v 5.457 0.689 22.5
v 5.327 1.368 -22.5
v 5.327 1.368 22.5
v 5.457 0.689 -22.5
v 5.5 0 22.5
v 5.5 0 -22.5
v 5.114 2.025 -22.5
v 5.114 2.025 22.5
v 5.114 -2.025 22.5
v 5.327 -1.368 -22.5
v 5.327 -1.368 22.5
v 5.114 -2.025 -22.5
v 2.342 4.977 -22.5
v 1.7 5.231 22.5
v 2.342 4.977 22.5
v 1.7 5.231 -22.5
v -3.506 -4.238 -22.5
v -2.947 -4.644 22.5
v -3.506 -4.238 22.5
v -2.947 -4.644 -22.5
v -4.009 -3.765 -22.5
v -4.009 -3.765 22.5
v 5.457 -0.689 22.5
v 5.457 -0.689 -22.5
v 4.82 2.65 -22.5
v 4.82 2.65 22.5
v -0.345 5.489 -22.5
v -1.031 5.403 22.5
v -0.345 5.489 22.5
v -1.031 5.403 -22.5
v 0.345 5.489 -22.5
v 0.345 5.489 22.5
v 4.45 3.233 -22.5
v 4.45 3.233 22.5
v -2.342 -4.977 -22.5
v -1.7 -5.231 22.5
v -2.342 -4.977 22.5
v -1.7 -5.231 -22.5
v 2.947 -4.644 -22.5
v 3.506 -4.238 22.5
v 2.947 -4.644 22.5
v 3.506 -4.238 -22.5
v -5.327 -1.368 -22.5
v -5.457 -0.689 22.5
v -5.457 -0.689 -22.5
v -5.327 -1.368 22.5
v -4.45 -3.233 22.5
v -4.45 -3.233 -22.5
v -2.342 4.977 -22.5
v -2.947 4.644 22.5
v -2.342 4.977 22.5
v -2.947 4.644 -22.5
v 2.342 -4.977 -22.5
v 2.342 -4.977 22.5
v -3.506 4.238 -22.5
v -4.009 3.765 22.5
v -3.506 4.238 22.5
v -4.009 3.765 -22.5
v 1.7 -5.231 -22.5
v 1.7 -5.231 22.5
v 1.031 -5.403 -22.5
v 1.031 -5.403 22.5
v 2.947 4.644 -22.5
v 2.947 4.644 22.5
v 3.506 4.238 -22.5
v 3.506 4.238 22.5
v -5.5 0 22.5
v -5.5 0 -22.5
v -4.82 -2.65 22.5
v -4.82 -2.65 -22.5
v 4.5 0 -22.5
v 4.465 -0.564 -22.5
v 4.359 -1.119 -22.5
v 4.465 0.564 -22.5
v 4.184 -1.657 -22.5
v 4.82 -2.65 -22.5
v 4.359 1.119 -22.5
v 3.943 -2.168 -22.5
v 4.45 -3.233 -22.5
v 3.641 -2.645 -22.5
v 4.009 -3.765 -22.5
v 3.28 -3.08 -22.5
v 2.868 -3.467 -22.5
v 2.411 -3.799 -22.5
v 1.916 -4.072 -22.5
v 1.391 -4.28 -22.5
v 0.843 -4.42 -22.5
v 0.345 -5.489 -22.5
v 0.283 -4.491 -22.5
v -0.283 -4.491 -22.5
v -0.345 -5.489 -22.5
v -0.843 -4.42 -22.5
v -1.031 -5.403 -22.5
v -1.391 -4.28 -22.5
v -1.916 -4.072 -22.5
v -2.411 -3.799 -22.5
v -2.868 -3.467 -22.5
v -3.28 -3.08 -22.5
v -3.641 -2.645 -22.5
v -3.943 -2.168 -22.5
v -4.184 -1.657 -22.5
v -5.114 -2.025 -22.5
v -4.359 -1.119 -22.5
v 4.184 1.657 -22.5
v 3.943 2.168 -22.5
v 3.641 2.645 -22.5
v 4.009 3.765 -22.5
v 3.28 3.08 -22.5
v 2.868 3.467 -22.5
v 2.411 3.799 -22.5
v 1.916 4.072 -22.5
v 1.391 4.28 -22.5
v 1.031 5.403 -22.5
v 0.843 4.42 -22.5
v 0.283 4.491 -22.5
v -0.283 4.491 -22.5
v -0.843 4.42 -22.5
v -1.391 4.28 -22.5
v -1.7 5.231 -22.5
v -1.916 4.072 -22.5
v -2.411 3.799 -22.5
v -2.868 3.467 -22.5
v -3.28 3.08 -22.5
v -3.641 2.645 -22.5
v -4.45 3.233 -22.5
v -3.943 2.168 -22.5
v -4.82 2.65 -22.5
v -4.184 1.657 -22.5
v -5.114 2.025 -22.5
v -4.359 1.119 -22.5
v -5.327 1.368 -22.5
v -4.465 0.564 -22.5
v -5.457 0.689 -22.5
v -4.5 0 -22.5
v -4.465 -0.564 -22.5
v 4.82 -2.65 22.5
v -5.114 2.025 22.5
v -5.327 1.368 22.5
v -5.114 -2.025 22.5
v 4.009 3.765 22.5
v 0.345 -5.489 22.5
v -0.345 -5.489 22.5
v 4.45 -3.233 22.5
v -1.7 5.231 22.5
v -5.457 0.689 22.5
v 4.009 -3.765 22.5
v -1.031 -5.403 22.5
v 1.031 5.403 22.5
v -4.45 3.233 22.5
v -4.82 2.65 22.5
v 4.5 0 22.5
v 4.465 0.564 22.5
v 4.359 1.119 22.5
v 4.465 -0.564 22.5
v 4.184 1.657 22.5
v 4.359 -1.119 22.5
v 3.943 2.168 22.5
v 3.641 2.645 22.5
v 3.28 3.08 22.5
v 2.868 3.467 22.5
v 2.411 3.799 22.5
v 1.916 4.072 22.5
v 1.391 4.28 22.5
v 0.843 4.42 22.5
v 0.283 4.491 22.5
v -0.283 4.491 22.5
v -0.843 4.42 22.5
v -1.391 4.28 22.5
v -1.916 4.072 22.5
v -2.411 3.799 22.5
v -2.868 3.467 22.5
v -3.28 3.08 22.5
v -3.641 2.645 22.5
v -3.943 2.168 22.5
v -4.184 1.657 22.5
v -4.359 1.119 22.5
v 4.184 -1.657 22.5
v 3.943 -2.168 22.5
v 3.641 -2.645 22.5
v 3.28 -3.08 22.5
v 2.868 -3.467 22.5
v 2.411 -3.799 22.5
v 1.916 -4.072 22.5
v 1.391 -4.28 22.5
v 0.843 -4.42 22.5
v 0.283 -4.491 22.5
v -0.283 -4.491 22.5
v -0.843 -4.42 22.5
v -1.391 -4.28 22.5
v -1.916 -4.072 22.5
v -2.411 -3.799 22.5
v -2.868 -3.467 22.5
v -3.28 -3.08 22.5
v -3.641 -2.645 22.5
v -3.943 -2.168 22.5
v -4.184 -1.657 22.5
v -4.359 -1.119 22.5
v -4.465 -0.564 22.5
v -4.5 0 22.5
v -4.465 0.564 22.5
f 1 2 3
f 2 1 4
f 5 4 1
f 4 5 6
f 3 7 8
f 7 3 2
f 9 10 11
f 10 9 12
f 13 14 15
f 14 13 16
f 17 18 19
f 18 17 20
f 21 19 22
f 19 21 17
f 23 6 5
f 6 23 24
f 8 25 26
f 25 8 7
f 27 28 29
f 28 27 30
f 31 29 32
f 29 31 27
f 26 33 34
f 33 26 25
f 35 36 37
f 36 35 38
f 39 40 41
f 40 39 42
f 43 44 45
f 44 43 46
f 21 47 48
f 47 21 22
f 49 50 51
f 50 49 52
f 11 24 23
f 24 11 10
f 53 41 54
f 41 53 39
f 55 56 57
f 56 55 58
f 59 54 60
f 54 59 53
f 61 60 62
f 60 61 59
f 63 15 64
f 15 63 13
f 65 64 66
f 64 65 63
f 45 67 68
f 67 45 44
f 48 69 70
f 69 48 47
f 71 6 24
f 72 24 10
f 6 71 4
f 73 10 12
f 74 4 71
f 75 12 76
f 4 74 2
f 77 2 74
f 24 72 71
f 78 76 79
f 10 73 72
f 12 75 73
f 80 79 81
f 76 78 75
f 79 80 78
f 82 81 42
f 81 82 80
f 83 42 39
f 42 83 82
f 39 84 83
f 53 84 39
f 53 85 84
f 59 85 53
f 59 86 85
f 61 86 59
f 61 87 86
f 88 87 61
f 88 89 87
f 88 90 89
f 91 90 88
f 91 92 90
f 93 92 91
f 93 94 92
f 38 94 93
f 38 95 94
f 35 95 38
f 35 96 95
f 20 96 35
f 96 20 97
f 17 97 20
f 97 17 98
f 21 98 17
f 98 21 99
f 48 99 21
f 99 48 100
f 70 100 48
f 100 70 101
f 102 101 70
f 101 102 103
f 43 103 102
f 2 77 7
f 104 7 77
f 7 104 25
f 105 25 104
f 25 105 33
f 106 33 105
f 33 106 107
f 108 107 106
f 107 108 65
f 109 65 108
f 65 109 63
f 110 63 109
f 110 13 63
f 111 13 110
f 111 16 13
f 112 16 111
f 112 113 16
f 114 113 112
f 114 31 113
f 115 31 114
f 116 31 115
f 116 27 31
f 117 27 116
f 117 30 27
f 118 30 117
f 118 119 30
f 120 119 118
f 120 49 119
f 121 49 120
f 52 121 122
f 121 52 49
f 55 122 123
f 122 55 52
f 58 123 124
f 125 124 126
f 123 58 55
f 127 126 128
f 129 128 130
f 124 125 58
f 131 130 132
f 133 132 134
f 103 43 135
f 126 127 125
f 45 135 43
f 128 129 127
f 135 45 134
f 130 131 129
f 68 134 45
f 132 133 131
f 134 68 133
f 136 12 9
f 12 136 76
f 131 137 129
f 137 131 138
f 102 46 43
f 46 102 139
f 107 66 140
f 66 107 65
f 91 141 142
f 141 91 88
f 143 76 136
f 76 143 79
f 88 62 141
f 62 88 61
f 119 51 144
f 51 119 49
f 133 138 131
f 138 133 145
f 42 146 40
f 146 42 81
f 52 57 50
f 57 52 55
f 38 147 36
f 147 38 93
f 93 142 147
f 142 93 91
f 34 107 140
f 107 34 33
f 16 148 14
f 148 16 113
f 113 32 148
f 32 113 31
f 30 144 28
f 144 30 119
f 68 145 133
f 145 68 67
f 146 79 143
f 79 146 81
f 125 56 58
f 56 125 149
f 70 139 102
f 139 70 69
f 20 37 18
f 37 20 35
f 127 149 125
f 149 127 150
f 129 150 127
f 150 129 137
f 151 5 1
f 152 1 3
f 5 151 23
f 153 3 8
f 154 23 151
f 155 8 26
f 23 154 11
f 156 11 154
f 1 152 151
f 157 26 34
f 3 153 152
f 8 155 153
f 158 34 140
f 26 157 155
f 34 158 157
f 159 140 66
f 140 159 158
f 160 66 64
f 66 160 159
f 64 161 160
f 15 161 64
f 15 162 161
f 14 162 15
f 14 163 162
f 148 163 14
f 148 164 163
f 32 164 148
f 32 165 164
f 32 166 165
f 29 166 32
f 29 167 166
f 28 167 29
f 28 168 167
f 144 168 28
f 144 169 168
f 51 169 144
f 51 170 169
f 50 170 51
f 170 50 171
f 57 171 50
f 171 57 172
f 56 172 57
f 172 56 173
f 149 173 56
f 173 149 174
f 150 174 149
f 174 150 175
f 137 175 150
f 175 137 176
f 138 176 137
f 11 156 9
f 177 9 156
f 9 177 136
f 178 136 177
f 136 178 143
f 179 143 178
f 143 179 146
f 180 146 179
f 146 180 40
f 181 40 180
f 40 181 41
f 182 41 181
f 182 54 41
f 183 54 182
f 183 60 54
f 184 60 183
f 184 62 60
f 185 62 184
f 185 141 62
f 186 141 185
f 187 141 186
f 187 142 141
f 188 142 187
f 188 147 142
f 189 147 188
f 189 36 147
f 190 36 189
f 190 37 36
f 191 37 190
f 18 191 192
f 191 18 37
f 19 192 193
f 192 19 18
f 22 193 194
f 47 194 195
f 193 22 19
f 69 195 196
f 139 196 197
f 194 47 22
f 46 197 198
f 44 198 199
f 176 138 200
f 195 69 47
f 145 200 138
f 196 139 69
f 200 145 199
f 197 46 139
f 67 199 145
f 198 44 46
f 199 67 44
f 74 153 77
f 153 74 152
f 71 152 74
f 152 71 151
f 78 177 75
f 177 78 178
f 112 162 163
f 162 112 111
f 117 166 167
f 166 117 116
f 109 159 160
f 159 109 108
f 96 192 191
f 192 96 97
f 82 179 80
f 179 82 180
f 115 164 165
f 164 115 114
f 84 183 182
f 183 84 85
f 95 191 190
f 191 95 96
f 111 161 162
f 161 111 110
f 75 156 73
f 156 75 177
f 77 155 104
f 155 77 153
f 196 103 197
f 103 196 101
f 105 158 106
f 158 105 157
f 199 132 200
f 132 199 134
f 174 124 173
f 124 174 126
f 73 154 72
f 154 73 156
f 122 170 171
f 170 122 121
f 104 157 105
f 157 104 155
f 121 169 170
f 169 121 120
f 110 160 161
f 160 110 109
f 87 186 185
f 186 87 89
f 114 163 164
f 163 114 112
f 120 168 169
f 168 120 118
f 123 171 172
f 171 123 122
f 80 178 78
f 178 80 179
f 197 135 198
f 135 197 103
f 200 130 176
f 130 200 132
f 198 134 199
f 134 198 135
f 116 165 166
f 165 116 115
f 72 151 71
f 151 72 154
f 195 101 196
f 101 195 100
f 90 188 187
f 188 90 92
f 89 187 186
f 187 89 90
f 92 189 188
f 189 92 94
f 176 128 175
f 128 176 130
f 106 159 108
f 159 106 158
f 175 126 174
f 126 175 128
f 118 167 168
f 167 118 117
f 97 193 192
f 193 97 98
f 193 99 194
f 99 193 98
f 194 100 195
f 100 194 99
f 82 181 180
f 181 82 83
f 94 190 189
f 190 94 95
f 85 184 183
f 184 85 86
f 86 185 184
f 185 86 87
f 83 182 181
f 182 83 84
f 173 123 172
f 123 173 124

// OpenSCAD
$fn = 50;


difference() {
	union() {
		translate(v = [0, 0, -22.5000000000]) {
			cylinder(h = 45, r = 5.5000000000);
		}
	}
	union() {
		translate(v = [0, 0, -100.0000000000]) {
			cylinder(h = 200, r = 4.5000000000);
		}
	}
}
